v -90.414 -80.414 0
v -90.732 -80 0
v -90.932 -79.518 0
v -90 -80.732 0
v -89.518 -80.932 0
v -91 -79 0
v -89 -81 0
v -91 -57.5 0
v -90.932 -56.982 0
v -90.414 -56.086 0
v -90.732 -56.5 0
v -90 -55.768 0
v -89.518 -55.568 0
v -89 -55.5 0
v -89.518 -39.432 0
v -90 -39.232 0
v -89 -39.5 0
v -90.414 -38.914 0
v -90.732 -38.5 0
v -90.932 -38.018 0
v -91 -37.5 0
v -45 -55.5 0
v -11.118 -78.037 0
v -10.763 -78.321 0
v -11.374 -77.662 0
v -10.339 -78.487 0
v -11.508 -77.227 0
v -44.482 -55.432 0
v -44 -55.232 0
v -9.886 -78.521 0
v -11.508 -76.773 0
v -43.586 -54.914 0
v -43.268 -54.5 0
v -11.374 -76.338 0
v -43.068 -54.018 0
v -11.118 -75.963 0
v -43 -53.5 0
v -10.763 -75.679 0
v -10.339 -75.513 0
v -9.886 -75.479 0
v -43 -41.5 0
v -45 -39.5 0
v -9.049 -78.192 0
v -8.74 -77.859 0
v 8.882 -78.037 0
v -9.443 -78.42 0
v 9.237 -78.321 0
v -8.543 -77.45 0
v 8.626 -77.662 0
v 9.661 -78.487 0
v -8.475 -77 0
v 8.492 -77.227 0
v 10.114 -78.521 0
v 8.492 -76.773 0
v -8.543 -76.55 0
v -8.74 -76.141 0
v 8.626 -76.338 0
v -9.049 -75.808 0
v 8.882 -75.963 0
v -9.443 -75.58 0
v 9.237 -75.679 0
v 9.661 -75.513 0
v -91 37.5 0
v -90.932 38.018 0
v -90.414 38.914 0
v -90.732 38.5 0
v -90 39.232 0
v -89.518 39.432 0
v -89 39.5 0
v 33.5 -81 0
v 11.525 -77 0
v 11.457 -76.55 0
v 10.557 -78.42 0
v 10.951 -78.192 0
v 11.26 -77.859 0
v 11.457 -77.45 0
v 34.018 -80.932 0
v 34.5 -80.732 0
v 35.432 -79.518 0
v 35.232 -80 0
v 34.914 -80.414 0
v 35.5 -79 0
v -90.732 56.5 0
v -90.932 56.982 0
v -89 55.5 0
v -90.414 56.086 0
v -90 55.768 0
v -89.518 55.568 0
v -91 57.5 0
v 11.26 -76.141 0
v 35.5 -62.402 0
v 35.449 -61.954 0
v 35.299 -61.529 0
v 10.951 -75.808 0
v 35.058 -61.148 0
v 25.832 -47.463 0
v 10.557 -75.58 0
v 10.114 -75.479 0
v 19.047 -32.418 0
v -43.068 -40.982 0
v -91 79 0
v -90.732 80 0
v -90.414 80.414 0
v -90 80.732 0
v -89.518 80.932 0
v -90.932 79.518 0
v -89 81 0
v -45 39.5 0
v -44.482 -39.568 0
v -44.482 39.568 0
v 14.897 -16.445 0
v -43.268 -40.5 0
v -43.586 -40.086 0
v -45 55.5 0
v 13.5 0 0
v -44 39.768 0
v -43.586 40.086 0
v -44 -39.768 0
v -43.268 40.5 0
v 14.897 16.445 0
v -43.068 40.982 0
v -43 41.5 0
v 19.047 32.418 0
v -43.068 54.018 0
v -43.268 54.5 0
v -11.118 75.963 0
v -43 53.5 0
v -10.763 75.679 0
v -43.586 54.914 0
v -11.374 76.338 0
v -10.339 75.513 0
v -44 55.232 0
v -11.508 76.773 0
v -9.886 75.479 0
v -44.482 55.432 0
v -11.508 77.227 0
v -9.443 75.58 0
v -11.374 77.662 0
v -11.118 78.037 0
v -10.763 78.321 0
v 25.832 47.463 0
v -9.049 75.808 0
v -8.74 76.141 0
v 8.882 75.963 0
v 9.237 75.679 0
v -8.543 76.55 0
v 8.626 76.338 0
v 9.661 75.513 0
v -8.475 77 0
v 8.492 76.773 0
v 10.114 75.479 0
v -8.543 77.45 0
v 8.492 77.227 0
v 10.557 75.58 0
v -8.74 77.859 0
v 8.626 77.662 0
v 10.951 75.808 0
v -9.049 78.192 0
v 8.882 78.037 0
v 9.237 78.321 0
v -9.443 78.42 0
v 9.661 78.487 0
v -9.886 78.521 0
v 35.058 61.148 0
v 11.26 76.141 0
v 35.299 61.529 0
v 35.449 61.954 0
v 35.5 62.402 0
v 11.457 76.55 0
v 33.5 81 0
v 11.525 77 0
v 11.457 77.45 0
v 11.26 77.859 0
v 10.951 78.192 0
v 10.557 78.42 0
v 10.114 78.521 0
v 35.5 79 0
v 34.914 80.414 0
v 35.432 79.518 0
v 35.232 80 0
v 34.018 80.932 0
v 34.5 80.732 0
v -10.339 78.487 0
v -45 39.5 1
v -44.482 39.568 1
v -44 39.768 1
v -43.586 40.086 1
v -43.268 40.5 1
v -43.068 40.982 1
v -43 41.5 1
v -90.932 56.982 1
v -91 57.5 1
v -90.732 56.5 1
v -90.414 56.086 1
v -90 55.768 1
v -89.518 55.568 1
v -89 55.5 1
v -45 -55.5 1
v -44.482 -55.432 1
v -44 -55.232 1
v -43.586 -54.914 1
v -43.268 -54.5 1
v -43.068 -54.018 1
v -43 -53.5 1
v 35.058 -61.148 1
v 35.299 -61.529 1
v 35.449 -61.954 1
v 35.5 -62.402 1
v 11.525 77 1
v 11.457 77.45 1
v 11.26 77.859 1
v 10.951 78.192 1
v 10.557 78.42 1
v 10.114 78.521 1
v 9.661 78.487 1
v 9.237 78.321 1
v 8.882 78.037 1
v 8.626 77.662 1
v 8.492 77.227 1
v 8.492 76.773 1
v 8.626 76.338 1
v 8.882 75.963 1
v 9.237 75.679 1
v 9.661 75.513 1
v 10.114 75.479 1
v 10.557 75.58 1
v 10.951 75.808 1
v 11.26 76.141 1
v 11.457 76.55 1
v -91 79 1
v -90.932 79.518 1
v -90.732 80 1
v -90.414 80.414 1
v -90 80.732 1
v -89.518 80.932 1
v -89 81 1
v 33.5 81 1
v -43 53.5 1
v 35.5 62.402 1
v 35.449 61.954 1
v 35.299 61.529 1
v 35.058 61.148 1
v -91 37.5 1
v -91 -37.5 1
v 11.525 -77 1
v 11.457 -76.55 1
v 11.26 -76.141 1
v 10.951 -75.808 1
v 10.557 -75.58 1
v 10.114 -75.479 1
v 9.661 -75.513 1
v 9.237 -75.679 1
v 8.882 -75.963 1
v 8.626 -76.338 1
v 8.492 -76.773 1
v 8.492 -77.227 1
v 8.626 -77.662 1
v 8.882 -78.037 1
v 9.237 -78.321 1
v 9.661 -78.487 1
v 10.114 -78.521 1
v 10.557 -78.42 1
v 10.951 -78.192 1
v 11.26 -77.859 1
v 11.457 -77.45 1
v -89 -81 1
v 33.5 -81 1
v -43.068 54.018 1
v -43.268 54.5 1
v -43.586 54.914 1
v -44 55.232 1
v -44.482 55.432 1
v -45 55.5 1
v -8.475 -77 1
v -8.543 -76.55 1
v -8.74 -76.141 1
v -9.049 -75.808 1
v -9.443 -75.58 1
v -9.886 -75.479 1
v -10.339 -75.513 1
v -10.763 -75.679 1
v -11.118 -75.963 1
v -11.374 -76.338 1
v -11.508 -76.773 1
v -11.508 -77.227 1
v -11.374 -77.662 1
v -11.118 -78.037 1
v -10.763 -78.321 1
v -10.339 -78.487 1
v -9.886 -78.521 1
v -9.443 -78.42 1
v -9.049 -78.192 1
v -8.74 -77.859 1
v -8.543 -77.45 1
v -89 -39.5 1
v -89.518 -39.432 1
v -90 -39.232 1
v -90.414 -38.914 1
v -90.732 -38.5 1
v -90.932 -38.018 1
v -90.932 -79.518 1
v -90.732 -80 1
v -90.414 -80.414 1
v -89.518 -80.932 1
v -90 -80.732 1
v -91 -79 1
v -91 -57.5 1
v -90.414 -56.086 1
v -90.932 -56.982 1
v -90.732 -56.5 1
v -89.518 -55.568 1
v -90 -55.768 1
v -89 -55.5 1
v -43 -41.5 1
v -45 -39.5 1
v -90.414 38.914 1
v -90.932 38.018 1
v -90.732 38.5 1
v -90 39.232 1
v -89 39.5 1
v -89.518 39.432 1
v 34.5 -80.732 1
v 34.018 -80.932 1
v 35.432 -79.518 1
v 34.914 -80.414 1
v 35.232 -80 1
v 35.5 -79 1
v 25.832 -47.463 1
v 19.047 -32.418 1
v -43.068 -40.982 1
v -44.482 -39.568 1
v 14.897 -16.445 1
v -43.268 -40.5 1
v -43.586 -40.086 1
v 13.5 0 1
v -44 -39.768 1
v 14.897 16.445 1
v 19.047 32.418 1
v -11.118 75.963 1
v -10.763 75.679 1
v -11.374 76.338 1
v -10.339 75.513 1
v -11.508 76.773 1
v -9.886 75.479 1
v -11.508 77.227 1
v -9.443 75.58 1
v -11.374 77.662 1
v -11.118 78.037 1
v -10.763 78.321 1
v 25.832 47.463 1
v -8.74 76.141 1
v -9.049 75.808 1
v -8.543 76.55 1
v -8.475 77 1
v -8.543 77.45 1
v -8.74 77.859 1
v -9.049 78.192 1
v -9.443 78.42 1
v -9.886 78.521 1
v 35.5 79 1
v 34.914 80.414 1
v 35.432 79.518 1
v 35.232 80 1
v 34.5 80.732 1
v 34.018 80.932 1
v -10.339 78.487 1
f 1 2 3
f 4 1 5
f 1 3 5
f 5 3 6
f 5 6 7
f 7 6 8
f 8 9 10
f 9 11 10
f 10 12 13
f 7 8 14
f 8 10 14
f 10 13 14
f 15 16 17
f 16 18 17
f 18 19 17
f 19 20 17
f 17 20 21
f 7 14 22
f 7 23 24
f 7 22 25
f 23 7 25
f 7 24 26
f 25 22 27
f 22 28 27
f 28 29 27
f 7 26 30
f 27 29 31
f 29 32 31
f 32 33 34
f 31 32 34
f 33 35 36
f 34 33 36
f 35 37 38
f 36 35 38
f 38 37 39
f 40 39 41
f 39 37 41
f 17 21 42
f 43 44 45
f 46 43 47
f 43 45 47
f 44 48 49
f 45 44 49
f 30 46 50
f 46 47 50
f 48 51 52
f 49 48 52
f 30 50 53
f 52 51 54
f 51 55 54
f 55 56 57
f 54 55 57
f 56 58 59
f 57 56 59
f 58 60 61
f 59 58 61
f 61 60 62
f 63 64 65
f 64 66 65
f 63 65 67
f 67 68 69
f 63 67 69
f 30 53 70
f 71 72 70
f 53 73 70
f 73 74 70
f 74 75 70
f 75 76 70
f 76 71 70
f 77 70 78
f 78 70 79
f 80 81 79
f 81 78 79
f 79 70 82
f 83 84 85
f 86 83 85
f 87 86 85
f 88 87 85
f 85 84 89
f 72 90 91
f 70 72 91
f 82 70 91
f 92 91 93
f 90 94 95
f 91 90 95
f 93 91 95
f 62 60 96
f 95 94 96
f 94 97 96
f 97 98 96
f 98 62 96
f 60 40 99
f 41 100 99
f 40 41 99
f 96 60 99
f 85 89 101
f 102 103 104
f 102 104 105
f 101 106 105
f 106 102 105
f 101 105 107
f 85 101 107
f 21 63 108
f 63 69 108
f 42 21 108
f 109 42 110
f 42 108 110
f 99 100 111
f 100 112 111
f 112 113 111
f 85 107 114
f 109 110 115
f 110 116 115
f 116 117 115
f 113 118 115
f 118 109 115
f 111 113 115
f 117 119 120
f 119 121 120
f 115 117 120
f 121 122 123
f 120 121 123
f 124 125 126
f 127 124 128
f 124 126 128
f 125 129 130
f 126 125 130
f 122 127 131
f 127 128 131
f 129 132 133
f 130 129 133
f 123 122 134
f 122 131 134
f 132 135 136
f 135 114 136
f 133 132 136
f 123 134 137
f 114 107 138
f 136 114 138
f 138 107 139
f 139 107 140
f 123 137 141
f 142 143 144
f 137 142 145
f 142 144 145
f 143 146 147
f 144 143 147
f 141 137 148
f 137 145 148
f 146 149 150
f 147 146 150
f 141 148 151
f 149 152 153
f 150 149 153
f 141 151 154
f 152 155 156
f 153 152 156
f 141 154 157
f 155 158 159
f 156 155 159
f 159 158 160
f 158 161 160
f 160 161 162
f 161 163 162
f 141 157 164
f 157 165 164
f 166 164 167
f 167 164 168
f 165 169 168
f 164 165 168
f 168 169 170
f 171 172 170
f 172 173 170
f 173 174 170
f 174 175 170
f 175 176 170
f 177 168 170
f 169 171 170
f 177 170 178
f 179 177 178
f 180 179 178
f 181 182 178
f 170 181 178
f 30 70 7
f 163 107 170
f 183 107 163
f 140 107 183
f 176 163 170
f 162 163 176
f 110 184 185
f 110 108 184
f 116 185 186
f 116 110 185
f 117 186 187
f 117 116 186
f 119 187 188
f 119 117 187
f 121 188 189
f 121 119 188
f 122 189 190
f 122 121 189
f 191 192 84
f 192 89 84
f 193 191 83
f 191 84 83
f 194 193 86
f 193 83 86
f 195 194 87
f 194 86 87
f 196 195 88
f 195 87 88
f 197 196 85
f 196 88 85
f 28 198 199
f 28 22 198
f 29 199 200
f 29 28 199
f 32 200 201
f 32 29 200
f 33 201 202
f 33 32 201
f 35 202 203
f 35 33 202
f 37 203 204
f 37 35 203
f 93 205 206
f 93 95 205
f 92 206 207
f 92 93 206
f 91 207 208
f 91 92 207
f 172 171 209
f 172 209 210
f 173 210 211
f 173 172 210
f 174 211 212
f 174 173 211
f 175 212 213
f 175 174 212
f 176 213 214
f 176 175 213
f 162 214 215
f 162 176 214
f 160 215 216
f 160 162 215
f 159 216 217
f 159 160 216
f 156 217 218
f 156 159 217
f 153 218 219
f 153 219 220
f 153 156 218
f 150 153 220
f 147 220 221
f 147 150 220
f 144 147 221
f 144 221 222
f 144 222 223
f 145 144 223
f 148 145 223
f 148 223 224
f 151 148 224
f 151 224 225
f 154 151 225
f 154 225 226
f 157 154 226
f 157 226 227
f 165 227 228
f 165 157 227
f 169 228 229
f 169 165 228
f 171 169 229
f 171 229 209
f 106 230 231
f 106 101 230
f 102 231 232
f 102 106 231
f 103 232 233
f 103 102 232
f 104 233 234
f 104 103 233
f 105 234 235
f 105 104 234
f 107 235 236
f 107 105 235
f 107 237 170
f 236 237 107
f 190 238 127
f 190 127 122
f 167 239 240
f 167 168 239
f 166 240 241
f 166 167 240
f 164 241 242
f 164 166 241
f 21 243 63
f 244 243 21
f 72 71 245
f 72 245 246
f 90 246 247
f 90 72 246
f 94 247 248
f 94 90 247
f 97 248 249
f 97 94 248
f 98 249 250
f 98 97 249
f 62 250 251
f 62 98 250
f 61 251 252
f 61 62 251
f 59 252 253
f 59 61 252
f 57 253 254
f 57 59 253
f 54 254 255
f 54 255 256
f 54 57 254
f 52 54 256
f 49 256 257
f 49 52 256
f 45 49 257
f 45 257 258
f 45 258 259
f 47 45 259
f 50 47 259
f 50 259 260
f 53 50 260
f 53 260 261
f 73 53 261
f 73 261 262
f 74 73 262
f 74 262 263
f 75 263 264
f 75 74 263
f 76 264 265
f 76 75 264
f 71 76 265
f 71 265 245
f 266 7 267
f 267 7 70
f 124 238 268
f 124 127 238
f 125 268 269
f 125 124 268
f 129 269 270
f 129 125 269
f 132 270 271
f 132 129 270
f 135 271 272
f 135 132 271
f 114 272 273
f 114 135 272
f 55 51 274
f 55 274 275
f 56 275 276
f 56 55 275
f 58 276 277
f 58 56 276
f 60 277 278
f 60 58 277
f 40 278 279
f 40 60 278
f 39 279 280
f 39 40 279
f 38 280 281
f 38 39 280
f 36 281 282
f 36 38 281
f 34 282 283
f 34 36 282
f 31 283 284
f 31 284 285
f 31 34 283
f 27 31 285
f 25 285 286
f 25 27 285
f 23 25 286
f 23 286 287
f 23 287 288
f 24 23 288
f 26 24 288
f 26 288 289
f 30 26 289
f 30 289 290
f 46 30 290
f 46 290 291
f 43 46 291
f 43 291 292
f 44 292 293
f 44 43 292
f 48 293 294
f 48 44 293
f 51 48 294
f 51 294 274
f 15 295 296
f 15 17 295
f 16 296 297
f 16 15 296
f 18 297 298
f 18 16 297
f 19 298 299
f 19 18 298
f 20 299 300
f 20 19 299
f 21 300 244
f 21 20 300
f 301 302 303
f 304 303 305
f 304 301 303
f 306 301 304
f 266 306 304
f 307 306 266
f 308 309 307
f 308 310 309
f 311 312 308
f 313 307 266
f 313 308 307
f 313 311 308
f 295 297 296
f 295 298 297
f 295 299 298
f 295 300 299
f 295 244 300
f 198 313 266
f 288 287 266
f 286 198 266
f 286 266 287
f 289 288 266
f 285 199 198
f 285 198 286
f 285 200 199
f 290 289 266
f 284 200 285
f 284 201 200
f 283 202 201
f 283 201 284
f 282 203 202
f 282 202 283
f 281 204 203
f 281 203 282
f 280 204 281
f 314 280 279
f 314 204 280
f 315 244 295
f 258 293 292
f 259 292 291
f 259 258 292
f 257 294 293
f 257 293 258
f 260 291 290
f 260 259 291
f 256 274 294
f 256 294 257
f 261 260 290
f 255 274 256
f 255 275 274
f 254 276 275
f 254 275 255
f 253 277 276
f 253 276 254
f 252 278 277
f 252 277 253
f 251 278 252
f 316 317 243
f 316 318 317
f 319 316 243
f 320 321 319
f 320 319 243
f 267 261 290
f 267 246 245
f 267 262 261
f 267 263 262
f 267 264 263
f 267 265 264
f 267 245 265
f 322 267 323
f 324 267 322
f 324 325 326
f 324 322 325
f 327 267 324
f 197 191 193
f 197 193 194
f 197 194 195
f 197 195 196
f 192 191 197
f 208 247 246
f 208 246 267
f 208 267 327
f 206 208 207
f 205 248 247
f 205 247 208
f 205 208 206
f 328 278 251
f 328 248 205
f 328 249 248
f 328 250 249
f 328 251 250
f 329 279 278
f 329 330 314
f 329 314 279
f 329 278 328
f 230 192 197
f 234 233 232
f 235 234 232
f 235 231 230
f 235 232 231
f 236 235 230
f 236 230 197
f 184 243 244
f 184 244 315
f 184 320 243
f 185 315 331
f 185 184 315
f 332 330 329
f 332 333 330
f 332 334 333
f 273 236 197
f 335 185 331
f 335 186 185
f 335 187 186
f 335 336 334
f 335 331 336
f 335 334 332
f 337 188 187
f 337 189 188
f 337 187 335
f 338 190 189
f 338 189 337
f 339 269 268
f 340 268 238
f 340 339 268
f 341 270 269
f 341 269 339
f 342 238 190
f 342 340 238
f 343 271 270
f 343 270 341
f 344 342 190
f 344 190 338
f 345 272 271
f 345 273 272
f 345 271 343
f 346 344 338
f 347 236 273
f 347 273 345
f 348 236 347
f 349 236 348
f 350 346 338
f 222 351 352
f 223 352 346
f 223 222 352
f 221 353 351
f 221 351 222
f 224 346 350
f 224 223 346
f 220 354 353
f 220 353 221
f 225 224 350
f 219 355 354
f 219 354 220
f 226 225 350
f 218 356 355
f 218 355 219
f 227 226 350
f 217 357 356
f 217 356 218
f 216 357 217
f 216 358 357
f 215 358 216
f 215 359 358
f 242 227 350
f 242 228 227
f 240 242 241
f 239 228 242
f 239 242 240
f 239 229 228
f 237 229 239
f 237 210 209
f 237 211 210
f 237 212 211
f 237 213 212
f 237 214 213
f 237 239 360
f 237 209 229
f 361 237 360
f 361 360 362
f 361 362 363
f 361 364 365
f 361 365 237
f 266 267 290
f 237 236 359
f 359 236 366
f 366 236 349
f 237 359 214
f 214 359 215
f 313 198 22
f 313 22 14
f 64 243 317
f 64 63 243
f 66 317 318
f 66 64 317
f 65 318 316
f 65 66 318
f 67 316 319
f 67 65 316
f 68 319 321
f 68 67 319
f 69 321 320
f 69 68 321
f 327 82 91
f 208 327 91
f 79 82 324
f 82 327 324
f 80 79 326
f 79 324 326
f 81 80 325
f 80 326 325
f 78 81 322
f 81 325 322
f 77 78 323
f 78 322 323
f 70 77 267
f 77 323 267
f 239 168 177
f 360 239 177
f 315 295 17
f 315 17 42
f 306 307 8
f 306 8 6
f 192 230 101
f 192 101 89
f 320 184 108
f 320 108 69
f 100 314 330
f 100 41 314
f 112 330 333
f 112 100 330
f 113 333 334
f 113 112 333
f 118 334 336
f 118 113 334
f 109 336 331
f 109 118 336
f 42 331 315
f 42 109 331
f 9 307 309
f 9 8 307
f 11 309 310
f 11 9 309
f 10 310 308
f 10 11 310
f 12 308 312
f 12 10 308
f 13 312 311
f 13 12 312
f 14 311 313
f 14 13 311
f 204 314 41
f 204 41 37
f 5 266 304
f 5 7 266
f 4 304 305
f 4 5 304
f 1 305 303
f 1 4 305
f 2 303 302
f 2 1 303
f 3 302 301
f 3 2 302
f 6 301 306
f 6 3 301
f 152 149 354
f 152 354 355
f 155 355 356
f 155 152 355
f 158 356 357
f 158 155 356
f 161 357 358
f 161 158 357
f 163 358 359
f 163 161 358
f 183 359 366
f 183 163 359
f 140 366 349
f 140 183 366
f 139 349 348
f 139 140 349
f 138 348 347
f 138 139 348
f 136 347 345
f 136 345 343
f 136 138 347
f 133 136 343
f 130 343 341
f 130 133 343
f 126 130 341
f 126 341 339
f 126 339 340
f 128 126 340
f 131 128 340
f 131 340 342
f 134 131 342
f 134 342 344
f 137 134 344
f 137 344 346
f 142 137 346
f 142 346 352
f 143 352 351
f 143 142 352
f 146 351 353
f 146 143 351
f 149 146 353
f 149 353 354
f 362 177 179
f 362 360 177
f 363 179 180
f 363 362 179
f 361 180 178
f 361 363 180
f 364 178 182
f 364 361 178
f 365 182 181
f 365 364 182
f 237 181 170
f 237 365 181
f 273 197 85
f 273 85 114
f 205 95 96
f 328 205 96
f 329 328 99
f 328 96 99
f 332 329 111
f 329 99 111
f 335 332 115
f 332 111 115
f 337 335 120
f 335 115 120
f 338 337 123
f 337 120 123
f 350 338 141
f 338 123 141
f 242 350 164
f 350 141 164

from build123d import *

# Parameters (mm, degrees)
SKETCH_1_W          = 80.5
SKETCH_1_H          = 162
SKETCH_1_R          = 1.525
EXTRUDE_1_DEPTH     = 1
SKETCH_2_R          = 97.5
CUT_EXTRUDE_1_DEPTH = 1
FILLET_1_R          = 2
EXTRUDE_2_DEPTH     = 1
FILLET_2_R          = 2
CUT_EXTRUDE_2_DEPTH = 10
FILLET_3_R          = 2


with BuildPart() as part:
    # 草图1 → 凸台-拉伸1 (new body)
    with BuildSketch(Plane.XY):
        with Locations((-4.75, 0)):
            Rectangle(SKETCH_1_W, SKETCH_1_H)
        with Locations((-10, 77)):
            Circle(SKETCH_1_R, mode=Mode.SUBTRACT)
        with Locations((10, 77)):
            Circle(SKETCH_1_R, mode=Mode.SUBTRACT)
        with Locations((-10, -77)):
            Circle(SKETCH_1_R, mode=Mode.SUBTRACT)
        with Locations((10, -77)):
            Circle(SKETCH_1_R, mode=Mode.SUBTRACT)
    extrude(amount=EXTRUDE_1_DEPTH)

    # 草图2 → 切除-拉伸1 (cut)
    with BuildSketch(Plane(origin=(0, 0, 0), x_dir=(-1, 0, 0), z_dir=(0, 0, -1))):
        with Locations((-111, 0)):
            Circle(SKETCH_2_R)
    extrude(amount=-CUT_EXTRUDE_1_DEPTH, mode=Mode.SUBTRACT)

    # 圆角1
    fillet_1_edges = [part.edges().sort_by_distance(p)[0] for p in [
        (35.5, -61.692787261, 0.5),
        (35.5, 61.692787261, 0.5),
        (35.5, -81, 0.5),
        (-45, -81, 0.5),
        (-45, 81, 0.5),
        (35.5, 81, 0.5),
    ]]
    fillet(fillet_1_edges, radius=FILLET_1_R)

    # 草图3 → 凸台-拉伸2 (add)
    with BuildSketch(Plane.XY.offset(1)):
        Polygon((-91, 81), (-91, 55.5), (-45, 55.5), (-45, 39.5), (-91, 39.5), (-91, -39.5), (-45, -39.5), (-45, -55.5), (-91, -55.5), (-91, -81), (-43, -81), (-43, 81), align=None)
    extrude(amount=-EXTRUDE_2_DEPTH)

    # 圆角2
    fillet_2_edges = [part.edges().sort_by_distance(p)[0] for p in [
        (-91, -81, 0.5),
        (-45, -55.5, 0.5),
        (-91, -55.5, 0.5),
        (-91, 55.5, 0.5),
        (-45, 55.5, 0.5),
        (-91, 81, 0.5),
        (-45, -39.5, 0.5),
        (-45, 39.5, 0.5),
        (-91, 39.5, 0.5),
        (-91, -39.5, 0.5),
    ]]
    fillet(fillet_2_edges, radius=FILLET_2_R)

    # 草图4 → 切除-拉伸2 (cut)
    with BuildSketch(Plane.XY.offset(1)):
        with BuildLine():
            Line((-47, 55.5), (-43, 55.5))
            Line((-43, 55.5), (-43, 39.5))
            Line((-43, 39.5), (-47, 39.5))
            ThreePointArc((-47, 39.5), (-45.585786438, 40.085786438), (-45, 41.5))
            Line((-45, 41.5), (-45, 53.5))
            ThreePointArc((-45, 53.5), (-45.585786438, 54.914213562), (-47, 55.5))
        make_face()
        with BuildLine():
            Line((-47, -39.5), (-43, -39.5))
            Line((-43, -39.5), (-43, -55.5))
            Line((-43, -55.5), (-47, -55.5))
            ThreePointArc((-47, -55.5), (-45.585786438, -54.914213562), (-45, -53.5))
            Line((-45, -53.5), (-45, -41.5))
            ThreePointArc((-45, -41.5), (-45.585786438, -40.085786438), (-47, -39.5))
        make_face()
    extrude(amount=-CUT_EXTRUDE_2_DEPTH, mode=Mode.SUBTRACT)

    # 圆角3
    fillet_3_edges = [part.edges().sort_by_distance(p)[0] for p in [
        (-43, 55.5, 0.5),
        (-43, 39.5, 0.5),
        (-43, -39.5, 0.5),
        (-43, -55.5, 0.5),
    ]]
    fillet(fillet_3_edges, radius=FILLET_3_R)


solid = part.part
